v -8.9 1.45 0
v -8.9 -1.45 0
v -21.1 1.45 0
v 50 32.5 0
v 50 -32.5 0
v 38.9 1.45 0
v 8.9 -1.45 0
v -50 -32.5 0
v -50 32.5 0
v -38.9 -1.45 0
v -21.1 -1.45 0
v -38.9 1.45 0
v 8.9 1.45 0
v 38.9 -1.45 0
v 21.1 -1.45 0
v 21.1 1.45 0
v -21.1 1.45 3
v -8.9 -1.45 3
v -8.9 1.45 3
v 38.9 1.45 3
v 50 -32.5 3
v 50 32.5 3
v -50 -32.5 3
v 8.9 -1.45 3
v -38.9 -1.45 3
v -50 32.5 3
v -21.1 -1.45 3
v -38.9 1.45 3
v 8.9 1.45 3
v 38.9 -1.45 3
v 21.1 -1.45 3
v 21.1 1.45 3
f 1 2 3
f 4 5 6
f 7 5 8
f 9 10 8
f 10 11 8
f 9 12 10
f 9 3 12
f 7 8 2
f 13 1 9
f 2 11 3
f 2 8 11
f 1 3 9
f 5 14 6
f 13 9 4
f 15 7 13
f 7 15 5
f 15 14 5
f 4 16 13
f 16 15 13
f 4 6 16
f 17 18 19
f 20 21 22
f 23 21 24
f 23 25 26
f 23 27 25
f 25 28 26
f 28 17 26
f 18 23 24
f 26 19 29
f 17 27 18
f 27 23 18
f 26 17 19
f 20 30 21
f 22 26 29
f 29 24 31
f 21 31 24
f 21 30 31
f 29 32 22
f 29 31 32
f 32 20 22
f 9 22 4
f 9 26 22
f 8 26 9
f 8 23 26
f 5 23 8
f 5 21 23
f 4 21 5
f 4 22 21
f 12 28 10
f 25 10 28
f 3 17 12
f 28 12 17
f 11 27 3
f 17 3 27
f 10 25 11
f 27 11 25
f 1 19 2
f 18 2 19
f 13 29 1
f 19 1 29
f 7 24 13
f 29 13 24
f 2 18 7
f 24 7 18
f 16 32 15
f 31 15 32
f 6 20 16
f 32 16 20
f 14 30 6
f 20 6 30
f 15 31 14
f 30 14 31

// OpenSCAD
// MakerBench Laser 2D: 100 x 65 x 3.0 mm panel with 3 centered slip-fit slots
// Units: mm

panel_w = 100.0;
panel_h = 65.0;
stock_t = 3.0;

tab_t = 3.0;
slot_len_final = 18.0;
kerf = 0.2;
slip_clearance = 0.10;

slot_w_final = tab_t + slip_clearance;
slot_len_drawn = slot_len_final - kerf;
slot_w_drawn = slot_w_final - kerf;

slot_count = 3;
web_between_slots = 12.0;
slot_pitch = slot_len_final + web_between_slots;

developed_area = panel_w * panel_h;
removed_cut_area_final = slot_count * slot_len_final * slot_w_final;
net_area_final = developed_area - removed_cut_area_final;

echo(str("MAKERBENCH-LASER2D: {",
    "\"units\":\"mm\",",
    "\"stock_thickness\":", stock_t, ",",
    "\"panel_width\":", panel_w, ",",
    "\"panel_height\":", panel_h, ",",
    "\"kerf\":", kerf, ",",
    "\"tab_thickness\":", tab_t, ",",
    "\"slip_clearance\":", slip_clearance, ",",
    "\"slot_count\":", slot_count, ",",
    "\"slot_length_final\":", slot_len_final, ",",
    "\"slot_width_final\":", slot_w_final, ",",
    "\"slot_length_drawn\":", slot_len_drawn, ",",
    "\"slot_width_drawn\":", slot_w_drawn, ",",
    "\"slot_pitch\":", slot_pitch, ",",
    "\"web_between_slots\":", web_between_slots, ",",
    "\"developed_area\":", developed_area, ",",
    "\"removed_cut_area_final\":", removed_cut_area_final, ",",
    "\"net_area_final\":", net_area_final,
"}"));

module slot_2d(cx, cy) {
    translate([cx, cy])
        square([slot_len_drawn, slot_w_drawn], center = true);
}

module panel_2d() {
    difference() {
        square([panel_w, panel_h], center = true);

        for (i = [0 : slot_count - 1]) {
            x = (i - (slot_count - 1) / 2) * slot_pitch;
            slot_2d(x, 0);
        }
    }
}

linear_extrude(height = stock_t)
    panel_2d();
